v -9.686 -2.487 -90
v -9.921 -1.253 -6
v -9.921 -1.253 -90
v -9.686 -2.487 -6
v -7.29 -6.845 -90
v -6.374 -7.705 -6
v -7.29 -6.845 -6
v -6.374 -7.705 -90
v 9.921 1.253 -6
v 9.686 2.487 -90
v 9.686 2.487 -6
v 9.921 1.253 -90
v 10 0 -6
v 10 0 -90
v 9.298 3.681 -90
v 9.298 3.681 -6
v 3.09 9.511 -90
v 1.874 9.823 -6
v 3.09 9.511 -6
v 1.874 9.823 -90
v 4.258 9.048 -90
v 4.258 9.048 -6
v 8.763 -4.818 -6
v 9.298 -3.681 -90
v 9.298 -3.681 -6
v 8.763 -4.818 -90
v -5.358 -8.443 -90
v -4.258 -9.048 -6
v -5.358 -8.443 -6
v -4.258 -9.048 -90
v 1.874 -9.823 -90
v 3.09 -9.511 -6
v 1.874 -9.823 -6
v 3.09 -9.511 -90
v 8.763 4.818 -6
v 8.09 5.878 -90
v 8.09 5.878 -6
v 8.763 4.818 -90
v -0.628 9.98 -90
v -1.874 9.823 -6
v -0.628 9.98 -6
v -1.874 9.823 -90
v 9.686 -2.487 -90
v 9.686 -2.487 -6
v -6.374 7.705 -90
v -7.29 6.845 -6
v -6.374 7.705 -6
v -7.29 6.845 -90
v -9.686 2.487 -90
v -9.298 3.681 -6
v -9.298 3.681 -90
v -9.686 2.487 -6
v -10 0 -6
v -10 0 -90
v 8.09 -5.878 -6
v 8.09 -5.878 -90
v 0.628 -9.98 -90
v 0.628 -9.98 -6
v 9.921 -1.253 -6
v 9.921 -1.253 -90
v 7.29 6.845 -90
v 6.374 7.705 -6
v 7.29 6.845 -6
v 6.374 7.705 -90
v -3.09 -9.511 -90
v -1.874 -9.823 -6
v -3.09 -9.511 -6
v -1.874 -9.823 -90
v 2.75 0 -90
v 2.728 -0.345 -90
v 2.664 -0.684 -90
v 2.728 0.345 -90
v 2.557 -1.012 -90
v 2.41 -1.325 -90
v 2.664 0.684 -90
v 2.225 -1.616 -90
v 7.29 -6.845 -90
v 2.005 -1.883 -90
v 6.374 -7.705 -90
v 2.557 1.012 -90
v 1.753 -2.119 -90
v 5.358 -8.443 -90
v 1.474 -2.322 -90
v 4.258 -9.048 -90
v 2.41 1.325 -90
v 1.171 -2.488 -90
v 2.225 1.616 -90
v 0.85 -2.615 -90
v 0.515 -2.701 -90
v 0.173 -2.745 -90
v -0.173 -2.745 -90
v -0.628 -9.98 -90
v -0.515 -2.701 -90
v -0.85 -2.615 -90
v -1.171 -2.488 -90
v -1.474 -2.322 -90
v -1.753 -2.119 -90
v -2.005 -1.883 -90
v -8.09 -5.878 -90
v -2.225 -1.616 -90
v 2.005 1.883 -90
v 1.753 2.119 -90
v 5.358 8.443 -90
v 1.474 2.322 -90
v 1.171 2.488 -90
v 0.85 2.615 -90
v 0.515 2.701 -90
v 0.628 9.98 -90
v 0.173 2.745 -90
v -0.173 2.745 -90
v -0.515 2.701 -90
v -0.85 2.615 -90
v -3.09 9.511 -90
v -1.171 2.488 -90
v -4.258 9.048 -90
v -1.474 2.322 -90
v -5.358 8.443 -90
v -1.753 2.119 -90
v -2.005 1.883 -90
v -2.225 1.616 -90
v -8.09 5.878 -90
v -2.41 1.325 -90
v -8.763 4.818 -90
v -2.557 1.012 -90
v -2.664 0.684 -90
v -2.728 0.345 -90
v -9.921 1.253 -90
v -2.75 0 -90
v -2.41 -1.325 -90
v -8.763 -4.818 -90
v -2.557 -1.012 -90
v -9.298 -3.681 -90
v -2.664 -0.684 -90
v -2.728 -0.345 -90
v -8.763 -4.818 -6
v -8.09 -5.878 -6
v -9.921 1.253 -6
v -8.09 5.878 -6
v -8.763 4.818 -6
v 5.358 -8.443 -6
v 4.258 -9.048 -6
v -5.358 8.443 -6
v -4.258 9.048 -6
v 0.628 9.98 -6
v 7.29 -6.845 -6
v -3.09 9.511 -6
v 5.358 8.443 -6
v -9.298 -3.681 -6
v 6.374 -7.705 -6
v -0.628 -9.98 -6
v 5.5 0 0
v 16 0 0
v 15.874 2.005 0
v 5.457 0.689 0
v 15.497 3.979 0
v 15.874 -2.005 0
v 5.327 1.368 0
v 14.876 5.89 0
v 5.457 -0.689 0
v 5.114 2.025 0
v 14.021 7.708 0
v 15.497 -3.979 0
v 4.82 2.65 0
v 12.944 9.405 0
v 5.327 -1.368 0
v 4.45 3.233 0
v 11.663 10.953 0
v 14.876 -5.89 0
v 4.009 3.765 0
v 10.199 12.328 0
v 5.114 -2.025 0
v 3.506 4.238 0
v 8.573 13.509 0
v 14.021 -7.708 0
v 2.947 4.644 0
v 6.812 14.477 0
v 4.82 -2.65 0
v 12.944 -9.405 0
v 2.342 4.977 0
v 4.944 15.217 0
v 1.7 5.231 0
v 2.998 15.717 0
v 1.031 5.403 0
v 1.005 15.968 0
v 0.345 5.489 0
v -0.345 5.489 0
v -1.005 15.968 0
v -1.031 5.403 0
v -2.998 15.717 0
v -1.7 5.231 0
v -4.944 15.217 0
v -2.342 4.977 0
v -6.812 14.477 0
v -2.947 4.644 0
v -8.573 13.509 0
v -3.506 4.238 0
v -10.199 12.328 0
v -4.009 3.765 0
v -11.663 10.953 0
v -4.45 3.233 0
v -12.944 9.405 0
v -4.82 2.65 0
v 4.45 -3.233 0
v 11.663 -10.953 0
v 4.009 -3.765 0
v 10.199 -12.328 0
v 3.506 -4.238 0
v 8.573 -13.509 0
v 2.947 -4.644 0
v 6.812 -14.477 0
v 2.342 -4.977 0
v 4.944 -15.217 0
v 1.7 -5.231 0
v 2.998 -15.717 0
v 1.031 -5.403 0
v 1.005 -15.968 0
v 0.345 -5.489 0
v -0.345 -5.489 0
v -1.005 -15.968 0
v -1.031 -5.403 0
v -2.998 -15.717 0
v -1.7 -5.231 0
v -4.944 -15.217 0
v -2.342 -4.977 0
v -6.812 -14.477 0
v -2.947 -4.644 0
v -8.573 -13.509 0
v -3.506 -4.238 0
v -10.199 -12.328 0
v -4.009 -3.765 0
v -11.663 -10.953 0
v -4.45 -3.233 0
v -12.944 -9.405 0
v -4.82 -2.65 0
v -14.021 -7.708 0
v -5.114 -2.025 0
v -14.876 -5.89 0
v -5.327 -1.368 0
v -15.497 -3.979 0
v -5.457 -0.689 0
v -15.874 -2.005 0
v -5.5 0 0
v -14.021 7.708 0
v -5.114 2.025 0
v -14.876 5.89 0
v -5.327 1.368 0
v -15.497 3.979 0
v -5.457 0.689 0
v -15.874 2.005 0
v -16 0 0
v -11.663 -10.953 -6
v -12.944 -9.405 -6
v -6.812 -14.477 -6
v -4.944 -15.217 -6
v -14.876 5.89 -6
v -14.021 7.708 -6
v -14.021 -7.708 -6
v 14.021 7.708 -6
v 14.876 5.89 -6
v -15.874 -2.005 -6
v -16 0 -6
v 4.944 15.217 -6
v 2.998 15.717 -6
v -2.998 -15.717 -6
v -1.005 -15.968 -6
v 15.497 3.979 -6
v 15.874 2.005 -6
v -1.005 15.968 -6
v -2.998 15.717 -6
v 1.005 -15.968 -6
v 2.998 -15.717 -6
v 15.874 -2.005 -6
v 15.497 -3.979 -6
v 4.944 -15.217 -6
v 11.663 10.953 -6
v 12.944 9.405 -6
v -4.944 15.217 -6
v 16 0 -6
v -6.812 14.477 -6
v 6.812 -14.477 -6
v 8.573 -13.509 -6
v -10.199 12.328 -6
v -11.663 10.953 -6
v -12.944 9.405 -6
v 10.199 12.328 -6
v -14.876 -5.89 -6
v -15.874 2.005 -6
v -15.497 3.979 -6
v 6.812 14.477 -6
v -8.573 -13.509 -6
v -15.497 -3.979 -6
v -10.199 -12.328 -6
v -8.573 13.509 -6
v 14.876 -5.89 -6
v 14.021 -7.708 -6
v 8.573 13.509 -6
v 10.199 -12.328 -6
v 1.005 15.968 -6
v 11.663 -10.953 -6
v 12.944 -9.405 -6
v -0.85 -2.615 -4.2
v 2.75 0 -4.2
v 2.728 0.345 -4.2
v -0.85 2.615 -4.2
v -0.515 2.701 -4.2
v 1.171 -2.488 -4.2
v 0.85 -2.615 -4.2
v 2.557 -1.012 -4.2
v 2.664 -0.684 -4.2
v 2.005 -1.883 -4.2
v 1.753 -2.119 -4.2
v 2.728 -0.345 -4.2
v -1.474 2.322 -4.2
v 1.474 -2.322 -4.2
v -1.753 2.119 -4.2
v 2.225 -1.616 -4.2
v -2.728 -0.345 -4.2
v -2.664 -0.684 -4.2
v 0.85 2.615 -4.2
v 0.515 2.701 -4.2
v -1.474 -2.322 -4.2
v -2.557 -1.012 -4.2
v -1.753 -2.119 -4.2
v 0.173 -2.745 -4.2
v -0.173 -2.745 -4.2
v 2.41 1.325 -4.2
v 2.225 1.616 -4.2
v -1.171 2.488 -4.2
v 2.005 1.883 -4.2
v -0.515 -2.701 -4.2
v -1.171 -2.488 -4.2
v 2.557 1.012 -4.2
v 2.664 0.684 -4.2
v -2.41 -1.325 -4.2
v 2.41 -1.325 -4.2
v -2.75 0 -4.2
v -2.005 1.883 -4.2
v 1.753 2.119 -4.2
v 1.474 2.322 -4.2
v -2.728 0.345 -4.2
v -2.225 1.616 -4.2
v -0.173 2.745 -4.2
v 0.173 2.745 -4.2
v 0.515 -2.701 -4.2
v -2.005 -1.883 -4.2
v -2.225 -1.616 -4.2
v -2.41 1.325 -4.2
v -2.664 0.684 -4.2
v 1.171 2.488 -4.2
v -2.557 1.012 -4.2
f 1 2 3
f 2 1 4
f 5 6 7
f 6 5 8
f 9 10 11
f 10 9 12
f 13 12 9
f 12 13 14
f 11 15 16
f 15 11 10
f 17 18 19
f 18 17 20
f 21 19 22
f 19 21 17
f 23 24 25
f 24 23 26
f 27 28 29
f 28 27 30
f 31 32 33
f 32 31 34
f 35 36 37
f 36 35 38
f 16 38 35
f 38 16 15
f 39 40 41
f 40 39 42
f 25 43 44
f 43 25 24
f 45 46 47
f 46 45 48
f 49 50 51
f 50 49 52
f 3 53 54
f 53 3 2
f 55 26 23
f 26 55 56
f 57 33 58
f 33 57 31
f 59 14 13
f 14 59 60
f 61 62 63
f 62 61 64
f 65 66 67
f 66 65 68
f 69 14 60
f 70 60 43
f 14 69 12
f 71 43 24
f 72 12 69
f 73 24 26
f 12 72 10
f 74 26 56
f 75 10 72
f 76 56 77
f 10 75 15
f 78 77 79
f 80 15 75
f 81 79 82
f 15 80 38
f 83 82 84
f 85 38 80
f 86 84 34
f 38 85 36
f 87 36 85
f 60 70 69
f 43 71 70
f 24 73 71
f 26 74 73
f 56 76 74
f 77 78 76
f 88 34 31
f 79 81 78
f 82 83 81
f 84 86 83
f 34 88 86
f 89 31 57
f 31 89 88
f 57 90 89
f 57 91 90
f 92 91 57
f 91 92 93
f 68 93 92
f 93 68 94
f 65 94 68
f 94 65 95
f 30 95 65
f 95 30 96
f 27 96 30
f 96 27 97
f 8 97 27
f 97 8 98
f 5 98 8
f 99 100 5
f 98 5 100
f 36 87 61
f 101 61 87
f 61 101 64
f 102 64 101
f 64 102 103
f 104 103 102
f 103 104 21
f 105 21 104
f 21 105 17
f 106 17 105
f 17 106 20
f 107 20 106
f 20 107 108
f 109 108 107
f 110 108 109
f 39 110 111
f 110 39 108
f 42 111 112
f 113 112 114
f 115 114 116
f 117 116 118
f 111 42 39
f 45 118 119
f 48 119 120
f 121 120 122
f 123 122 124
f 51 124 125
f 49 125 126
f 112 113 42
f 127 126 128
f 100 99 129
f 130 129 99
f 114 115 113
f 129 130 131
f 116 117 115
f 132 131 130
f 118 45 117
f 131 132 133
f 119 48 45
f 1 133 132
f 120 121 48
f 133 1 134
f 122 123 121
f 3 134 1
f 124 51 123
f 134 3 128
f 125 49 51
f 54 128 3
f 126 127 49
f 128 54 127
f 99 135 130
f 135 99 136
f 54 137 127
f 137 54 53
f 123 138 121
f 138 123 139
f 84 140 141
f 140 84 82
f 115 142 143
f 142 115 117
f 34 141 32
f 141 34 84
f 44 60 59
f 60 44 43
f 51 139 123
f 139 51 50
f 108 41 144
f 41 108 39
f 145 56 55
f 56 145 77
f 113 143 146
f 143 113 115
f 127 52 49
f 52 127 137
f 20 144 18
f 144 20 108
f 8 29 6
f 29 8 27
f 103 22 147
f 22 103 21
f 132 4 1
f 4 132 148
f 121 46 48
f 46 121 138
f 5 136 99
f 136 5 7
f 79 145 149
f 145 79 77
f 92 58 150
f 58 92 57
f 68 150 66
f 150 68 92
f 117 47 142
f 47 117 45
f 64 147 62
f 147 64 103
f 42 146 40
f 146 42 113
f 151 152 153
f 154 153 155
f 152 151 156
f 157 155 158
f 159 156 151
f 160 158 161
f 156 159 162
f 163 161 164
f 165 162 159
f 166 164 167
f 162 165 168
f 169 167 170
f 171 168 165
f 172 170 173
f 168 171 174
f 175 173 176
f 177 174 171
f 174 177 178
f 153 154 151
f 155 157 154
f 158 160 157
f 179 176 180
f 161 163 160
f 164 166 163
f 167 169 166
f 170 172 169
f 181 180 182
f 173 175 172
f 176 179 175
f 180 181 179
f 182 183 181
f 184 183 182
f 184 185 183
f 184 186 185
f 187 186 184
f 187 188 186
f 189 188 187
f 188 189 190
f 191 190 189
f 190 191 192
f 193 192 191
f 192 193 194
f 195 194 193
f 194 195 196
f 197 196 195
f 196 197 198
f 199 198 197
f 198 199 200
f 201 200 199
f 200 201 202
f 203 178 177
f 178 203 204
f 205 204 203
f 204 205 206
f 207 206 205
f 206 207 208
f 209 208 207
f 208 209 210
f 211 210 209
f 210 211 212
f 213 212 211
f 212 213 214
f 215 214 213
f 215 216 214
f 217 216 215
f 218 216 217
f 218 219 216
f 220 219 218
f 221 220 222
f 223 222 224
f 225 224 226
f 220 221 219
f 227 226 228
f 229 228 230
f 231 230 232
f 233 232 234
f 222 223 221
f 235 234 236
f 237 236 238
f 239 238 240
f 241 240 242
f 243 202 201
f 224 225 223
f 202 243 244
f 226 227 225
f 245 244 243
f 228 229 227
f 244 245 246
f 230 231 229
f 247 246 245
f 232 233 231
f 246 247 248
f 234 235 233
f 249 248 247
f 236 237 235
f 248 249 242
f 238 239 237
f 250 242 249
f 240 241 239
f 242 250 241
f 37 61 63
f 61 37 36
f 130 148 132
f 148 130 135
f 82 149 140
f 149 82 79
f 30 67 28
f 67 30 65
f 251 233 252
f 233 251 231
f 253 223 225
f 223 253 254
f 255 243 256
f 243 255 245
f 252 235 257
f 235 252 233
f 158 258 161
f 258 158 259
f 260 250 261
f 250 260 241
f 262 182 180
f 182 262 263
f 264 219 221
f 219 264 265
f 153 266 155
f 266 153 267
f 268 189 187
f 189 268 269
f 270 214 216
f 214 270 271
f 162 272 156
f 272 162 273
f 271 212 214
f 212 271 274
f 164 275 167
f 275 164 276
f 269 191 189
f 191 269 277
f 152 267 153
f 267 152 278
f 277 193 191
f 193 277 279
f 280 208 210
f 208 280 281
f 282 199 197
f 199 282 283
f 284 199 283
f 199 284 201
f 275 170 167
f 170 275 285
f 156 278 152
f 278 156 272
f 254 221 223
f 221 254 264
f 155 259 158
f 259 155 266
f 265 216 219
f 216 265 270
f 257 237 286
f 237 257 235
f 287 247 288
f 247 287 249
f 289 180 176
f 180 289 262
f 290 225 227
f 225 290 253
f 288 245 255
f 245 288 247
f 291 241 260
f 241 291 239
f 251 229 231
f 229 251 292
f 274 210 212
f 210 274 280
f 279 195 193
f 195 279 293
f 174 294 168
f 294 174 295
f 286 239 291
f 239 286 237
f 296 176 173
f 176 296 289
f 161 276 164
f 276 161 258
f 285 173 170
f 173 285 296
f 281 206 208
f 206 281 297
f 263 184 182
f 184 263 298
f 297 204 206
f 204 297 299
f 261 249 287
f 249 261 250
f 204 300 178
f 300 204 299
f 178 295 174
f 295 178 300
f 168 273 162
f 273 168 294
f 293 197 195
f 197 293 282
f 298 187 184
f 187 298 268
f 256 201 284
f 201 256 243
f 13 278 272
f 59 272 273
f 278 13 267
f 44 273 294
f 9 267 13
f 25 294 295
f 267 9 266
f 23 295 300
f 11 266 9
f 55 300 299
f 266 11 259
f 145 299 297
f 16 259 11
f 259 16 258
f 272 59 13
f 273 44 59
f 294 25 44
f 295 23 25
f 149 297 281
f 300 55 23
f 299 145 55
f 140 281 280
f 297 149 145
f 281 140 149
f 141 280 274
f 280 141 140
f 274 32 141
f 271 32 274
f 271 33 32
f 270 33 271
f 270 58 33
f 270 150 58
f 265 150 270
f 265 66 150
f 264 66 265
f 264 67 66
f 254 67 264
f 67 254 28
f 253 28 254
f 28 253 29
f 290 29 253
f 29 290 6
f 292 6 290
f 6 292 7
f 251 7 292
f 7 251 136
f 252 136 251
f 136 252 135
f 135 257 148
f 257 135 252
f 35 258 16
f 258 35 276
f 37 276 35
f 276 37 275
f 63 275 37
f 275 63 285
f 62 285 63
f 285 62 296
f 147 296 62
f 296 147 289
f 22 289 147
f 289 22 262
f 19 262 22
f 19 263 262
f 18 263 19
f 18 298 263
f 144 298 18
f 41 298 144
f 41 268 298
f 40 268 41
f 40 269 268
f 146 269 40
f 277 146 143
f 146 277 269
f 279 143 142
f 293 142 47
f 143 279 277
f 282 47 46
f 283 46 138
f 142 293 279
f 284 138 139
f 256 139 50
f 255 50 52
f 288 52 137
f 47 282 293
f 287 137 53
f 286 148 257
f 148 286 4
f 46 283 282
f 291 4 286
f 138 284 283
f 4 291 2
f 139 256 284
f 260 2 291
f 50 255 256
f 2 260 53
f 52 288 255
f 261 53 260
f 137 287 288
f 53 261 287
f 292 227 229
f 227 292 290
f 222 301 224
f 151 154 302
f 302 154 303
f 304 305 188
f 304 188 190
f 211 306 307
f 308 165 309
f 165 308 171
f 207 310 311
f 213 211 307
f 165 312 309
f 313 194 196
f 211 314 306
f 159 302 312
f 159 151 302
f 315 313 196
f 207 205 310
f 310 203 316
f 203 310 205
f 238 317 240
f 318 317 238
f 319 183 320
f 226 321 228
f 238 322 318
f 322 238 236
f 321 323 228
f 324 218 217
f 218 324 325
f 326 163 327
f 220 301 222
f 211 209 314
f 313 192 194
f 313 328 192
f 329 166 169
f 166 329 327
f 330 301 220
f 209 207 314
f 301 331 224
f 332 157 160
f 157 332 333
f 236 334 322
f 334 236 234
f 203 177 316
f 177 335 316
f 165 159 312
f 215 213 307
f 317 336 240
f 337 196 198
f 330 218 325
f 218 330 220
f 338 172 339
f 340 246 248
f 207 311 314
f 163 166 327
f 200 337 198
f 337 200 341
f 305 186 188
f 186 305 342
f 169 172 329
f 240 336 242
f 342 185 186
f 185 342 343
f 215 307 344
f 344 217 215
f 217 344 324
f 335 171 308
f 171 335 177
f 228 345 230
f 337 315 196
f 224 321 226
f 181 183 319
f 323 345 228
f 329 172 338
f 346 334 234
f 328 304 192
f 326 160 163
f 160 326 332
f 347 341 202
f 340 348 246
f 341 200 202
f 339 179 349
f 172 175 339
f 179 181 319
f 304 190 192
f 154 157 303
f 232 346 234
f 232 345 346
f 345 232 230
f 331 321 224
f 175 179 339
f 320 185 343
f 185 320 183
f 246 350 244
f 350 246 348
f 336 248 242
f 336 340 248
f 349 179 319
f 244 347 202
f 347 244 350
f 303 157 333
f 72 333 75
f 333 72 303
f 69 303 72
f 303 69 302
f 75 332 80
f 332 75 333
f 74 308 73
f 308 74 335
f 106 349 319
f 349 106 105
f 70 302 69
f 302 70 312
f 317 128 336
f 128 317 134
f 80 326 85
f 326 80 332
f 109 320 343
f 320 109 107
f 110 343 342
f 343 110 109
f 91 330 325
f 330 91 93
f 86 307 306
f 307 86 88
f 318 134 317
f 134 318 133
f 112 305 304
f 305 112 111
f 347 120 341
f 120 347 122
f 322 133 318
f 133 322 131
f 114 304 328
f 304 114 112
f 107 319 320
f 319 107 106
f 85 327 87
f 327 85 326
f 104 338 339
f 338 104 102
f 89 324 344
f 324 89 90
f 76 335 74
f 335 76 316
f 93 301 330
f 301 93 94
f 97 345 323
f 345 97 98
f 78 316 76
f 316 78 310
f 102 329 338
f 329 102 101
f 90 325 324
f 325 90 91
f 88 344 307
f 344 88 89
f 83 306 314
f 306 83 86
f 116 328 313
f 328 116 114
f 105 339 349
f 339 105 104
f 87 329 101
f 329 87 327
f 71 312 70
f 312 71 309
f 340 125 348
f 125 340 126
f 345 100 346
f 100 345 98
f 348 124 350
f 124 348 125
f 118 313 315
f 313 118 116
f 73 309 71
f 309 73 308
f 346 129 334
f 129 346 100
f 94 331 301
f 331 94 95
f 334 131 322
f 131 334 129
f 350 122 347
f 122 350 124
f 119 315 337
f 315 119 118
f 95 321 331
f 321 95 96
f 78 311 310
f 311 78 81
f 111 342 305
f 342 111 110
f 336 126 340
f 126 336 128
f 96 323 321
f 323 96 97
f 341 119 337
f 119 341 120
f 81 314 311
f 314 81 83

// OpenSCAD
$fn = 50;


difference() {
	union() {
		translate(v = [0, 0, -90.0000000000]) {
			cylinder(h = 90, r = 10.0000000000);
		}
		translate(v = [0, 0, -6.0000000000]) {
			cylinder(h = 6, r = 16.0000000000);
		}
	}
	union() {
		translate(v = [0, 0, 0]) {
			rotate(a = [0, 0, 0]) {
				difference() {
					union() {
						#translate(v = [0, 0, -90.0000000000]) {
							cylinder(h = 90, r = 2.2500000000);
						}
						#translate(v = [0, 0, -4.2000000000]) {
							cylinder(h = 4.2000000000, r1 = 2.7500000000, r2 = 5.5000000000);
						}
						#translate(v = [0, 0, -90.0000000000]) {
							cylinder(h = 90, r = 2.7500000000);
						}
						#translate(v = [0, 0, -90.0000000000]) {
							cylinder(h = 90, r = 2.2500000000);
						}
					}
					union();
				}
			}
		}
	}
}
